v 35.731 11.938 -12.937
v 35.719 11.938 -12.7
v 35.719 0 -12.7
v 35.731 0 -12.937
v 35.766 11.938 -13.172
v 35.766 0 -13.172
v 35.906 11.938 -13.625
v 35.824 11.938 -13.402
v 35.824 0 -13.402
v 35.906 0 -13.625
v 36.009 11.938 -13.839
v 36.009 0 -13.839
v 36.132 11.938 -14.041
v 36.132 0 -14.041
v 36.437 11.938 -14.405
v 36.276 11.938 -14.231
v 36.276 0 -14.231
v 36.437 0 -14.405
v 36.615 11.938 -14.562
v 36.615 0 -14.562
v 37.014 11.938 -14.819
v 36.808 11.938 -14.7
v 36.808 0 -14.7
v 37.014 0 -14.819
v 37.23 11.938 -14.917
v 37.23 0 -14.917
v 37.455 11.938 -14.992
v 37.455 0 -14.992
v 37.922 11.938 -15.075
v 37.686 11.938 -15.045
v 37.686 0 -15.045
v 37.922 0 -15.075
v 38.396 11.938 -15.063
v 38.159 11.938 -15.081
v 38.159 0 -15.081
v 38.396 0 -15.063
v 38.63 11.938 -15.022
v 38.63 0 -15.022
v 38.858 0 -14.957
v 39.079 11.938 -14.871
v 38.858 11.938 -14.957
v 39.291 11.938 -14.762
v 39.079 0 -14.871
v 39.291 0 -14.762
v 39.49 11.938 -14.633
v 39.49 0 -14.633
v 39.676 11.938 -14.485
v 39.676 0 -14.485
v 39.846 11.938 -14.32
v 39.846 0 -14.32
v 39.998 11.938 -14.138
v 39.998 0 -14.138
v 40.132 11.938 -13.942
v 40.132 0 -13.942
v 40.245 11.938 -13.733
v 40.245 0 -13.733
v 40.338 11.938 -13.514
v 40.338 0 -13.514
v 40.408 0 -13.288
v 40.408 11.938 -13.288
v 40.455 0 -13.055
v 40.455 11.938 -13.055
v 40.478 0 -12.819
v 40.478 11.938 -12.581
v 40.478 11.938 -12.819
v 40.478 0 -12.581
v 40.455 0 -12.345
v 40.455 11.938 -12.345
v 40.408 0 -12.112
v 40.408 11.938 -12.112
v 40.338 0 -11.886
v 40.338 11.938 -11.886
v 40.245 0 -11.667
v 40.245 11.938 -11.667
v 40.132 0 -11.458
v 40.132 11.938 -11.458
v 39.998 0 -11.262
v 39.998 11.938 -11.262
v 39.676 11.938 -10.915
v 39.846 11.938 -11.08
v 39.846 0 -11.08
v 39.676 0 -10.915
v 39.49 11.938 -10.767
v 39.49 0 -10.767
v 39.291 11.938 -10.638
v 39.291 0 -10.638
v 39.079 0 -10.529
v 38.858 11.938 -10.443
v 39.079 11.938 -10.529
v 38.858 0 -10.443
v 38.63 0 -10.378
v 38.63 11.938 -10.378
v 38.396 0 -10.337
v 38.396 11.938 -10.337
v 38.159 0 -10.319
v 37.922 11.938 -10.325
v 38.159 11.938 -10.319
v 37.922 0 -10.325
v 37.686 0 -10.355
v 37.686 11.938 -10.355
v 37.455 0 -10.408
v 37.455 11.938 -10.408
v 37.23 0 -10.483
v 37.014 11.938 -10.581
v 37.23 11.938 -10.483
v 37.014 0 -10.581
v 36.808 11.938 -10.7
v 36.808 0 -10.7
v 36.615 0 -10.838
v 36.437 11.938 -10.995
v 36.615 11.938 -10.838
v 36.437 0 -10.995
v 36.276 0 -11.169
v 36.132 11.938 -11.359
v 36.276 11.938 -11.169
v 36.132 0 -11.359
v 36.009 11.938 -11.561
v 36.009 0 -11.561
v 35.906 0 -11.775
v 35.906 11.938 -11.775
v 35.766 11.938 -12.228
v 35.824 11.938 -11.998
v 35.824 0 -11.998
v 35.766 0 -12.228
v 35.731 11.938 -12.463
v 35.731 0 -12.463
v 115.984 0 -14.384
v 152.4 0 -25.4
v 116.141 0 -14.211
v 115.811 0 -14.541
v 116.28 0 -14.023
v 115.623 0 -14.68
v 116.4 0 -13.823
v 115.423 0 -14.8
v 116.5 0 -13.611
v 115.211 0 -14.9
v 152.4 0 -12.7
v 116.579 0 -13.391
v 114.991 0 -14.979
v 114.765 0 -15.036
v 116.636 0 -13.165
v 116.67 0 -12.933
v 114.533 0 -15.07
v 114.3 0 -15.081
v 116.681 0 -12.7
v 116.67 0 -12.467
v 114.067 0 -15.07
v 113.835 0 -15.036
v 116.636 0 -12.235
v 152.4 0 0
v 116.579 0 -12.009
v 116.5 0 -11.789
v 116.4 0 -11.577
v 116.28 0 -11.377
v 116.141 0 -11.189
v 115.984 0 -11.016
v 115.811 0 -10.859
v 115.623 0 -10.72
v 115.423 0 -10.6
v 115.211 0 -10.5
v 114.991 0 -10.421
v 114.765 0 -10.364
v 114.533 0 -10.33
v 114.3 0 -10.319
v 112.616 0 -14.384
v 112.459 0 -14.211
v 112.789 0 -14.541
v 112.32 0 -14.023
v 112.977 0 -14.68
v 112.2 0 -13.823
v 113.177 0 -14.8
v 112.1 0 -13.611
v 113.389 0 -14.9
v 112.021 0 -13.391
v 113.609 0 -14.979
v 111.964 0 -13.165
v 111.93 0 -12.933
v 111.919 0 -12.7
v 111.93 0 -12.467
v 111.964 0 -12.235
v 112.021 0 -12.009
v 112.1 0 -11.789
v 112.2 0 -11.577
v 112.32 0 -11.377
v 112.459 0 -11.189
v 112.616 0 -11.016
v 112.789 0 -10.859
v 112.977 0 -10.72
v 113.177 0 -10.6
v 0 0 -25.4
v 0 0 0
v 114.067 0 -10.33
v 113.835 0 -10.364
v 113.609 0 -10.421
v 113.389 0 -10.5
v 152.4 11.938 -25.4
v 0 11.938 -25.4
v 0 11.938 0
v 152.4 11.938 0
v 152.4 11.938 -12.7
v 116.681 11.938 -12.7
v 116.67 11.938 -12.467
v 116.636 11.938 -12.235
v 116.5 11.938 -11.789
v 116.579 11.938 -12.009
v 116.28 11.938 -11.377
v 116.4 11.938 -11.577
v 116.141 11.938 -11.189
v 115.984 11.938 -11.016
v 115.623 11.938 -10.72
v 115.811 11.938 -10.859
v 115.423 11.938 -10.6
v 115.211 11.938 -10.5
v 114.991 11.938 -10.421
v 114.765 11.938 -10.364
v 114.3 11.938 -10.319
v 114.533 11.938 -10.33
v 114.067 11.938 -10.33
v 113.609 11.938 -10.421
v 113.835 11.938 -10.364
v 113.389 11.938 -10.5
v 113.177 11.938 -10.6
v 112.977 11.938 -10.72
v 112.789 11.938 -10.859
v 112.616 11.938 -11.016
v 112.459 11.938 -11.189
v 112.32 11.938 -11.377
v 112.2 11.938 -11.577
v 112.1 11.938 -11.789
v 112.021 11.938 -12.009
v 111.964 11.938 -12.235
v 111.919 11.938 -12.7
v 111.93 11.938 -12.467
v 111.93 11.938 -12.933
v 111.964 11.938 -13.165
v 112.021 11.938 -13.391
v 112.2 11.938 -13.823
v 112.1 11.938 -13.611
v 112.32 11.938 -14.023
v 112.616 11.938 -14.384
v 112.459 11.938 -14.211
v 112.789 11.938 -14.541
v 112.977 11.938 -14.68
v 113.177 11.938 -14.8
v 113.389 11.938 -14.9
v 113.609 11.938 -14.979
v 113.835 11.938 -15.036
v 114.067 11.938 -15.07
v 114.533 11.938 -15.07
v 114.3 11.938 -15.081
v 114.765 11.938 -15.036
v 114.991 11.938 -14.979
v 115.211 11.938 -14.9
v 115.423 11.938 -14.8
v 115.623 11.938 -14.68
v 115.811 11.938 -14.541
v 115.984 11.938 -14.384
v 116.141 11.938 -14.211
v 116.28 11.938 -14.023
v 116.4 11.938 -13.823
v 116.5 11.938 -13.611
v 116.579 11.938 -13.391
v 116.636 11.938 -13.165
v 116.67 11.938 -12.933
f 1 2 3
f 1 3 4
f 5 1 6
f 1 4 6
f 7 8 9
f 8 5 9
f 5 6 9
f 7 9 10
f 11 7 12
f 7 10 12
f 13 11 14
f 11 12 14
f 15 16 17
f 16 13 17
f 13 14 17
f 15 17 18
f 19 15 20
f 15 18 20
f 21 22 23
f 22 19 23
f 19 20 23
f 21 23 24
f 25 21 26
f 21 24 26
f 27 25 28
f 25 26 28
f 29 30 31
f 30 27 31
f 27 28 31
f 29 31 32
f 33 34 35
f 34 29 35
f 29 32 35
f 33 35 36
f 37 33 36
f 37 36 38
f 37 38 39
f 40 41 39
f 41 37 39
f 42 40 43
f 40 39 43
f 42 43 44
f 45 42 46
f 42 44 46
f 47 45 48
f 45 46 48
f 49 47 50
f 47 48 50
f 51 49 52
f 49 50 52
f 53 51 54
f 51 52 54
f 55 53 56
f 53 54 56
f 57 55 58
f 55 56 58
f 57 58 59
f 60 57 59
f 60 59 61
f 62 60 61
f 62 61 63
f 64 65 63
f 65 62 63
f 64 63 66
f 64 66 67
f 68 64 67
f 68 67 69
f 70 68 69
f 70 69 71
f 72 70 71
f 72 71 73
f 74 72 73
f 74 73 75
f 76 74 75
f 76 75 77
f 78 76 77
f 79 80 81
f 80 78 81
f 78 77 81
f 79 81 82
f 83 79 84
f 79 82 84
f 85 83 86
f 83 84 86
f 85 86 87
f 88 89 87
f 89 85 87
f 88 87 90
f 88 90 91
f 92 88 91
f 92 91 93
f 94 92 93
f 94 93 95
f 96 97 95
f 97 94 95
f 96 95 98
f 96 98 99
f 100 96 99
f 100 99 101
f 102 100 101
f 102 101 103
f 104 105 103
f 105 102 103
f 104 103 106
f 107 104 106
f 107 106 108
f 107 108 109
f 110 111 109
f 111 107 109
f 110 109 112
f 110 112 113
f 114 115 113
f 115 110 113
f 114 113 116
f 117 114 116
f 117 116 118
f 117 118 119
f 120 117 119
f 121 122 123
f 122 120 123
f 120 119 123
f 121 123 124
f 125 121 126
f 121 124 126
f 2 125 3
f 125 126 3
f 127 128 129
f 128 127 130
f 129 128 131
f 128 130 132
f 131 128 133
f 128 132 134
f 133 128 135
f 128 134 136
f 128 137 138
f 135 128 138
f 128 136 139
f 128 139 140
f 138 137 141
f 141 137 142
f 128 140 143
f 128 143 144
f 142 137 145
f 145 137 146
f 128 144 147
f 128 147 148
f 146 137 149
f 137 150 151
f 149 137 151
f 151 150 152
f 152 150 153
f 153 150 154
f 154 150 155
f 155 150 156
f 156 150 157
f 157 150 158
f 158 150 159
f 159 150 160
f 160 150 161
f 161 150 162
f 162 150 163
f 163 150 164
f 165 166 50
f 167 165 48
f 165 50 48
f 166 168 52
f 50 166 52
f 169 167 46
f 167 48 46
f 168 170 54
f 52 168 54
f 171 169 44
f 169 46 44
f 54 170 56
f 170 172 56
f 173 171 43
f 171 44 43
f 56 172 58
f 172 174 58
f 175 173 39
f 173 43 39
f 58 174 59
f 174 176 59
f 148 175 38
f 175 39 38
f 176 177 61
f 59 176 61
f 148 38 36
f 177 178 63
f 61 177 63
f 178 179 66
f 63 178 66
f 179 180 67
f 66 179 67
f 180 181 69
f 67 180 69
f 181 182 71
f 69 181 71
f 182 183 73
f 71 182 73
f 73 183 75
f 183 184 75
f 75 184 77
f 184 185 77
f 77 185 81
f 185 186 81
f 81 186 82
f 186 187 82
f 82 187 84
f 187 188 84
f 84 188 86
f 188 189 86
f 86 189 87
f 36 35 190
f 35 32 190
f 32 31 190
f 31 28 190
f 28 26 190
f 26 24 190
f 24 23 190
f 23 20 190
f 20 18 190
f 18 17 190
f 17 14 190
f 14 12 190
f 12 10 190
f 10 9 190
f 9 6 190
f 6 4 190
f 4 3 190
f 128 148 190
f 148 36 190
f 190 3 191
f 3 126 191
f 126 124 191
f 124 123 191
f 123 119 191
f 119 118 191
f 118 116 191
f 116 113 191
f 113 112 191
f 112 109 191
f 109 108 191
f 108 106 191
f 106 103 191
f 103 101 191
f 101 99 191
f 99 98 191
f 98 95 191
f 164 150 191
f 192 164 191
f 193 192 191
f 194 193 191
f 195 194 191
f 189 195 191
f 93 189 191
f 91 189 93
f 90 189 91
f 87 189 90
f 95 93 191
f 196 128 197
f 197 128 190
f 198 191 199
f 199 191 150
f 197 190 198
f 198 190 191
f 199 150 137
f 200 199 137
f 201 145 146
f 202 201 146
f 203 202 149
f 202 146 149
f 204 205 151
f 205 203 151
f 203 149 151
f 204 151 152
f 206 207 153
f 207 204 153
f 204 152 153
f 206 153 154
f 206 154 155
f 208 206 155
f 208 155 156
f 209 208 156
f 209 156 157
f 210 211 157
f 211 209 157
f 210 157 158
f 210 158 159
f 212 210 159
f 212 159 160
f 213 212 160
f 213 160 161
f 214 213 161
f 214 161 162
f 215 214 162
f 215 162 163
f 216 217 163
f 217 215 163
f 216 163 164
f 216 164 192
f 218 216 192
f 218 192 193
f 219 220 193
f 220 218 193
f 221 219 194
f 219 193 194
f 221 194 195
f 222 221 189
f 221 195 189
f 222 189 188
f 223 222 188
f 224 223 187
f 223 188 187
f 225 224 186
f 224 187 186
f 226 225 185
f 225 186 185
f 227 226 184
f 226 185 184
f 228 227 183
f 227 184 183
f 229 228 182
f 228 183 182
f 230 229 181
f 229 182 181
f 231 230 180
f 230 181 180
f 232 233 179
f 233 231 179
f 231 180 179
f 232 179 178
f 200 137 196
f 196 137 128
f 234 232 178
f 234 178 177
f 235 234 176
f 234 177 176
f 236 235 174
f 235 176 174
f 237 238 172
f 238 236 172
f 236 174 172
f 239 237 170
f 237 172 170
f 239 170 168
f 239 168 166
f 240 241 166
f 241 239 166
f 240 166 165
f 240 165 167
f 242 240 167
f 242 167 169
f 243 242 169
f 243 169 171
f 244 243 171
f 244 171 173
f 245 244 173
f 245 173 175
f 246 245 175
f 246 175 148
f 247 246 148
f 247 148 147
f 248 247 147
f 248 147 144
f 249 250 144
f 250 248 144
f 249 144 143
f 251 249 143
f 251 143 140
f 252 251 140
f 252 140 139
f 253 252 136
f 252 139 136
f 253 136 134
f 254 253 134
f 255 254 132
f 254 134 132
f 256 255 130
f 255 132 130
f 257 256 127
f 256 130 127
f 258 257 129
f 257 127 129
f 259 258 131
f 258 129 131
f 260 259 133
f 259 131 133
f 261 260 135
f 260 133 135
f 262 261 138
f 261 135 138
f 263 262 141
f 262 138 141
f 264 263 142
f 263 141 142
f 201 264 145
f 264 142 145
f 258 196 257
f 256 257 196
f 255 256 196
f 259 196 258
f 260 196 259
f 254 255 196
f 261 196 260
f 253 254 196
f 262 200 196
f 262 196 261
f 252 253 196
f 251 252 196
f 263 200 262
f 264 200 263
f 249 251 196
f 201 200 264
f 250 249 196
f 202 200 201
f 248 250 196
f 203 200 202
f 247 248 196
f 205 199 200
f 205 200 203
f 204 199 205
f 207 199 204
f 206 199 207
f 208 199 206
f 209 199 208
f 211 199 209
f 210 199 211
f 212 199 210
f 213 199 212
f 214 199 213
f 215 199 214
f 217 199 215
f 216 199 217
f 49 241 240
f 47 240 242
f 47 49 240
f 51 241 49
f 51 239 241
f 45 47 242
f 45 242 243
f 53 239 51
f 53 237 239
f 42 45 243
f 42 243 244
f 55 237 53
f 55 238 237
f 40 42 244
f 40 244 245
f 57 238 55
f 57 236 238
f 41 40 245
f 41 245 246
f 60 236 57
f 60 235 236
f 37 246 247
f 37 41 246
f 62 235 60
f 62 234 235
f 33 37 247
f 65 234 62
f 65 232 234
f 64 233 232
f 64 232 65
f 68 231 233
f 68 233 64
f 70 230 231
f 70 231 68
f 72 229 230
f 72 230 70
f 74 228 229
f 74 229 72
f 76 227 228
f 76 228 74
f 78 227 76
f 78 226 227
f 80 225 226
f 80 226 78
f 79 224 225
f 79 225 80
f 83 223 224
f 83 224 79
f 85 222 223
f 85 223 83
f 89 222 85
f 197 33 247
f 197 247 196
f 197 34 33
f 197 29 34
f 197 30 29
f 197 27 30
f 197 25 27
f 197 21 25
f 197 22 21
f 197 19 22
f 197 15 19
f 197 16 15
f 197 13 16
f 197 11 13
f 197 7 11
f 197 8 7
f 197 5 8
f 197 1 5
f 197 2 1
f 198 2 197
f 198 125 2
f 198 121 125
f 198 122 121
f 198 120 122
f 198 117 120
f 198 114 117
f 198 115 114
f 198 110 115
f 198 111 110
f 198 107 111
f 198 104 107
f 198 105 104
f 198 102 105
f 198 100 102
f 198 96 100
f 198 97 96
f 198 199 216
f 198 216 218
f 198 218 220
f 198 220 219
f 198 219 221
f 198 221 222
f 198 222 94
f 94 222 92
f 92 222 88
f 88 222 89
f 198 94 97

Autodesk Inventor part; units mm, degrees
ref_plane "YZ Plane" through (0, 0, 0) normal (1, 0, 0) x (0, 1, 0)
ref_plane "XZ Plane" through (0, 0, 0) normal (0, 1, 0) x (-1, 0, 0)
ref_plane "XY Plane" through (0, 0, 0) normal (0, 0, 1) x (1, 0, 0)
sketch "Sketch1" plane through (0, 0, 0) normal (0, 1, 0) x (-1, 0, 0)
  line L0 (0, 0) -> (-152.4, 0)
  line L1 (-152.4, 0) -> (-152.4, -25.4)
  line L2 (-152.4, -25.4) -> (0, -25.4)
  line L3 (0, -25.4) -> (0, 0)
  line L4 (-152.4, -12.7) -> (0, -12.7) construction
  line L5 (-152.4, -12.7) -> (-114.3, -12.7)
  circle A0 centre (-114.3, -12.7) radius 2.3813
  line L6 (-76.2, 0) -> (-76.2, -25.4) construction
  circle A1 centre (-38.1, -12.7) radius 2.3813
  dimension "d0" = 152.4
  dimension "d1" = 25.4
  dimension "d10" = 38.1
  dimension "d11" = 4.7625
extrude "Extrusion1" add sketch "Sketch1" along normal blind 11.938
properties part number "flat"
